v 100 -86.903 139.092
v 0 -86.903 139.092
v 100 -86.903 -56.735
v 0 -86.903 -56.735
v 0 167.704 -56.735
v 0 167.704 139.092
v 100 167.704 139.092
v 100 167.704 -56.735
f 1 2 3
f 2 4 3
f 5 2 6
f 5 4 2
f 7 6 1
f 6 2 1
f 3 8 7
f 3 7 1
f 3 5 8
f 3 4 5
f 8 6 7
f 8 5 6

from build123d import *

# Parameters (mm, degrees)
F0_W     = 194.6072131395
F0_H     = 115.8261597157
F1_DEPTH = 100
F2_DEPTH = 60
F3_DEPTH = 80


with BuildPart() as f1:
    # F0 (on Right) → F1 (new body)
    with BuildSketch(Plane.YZ):
        with Locations((10.4003921151, 1.1784434319)):
            Rectangle(F0_W, F0_H)
    extrude(amount=F1_DEPTH)

    # F2 (add): a face of the model
    f2_faces = [f1.faces().sort_by_distance(p)[0] for p in [
        (50, 107.7039986849, 1.1784434319),
    ]]
    extrude(f2_faces, amount=F2_DEPTH)

    # F3 (add): a face of the model
    f3_faces = [f1.faces().sort_by_distance(p)[0] for p in [
        (50, 40.4003921151, 59.0915232897),
    ]]
    extrude(f3_faces, amount=F3_DEPTH)


solid = f1.part
